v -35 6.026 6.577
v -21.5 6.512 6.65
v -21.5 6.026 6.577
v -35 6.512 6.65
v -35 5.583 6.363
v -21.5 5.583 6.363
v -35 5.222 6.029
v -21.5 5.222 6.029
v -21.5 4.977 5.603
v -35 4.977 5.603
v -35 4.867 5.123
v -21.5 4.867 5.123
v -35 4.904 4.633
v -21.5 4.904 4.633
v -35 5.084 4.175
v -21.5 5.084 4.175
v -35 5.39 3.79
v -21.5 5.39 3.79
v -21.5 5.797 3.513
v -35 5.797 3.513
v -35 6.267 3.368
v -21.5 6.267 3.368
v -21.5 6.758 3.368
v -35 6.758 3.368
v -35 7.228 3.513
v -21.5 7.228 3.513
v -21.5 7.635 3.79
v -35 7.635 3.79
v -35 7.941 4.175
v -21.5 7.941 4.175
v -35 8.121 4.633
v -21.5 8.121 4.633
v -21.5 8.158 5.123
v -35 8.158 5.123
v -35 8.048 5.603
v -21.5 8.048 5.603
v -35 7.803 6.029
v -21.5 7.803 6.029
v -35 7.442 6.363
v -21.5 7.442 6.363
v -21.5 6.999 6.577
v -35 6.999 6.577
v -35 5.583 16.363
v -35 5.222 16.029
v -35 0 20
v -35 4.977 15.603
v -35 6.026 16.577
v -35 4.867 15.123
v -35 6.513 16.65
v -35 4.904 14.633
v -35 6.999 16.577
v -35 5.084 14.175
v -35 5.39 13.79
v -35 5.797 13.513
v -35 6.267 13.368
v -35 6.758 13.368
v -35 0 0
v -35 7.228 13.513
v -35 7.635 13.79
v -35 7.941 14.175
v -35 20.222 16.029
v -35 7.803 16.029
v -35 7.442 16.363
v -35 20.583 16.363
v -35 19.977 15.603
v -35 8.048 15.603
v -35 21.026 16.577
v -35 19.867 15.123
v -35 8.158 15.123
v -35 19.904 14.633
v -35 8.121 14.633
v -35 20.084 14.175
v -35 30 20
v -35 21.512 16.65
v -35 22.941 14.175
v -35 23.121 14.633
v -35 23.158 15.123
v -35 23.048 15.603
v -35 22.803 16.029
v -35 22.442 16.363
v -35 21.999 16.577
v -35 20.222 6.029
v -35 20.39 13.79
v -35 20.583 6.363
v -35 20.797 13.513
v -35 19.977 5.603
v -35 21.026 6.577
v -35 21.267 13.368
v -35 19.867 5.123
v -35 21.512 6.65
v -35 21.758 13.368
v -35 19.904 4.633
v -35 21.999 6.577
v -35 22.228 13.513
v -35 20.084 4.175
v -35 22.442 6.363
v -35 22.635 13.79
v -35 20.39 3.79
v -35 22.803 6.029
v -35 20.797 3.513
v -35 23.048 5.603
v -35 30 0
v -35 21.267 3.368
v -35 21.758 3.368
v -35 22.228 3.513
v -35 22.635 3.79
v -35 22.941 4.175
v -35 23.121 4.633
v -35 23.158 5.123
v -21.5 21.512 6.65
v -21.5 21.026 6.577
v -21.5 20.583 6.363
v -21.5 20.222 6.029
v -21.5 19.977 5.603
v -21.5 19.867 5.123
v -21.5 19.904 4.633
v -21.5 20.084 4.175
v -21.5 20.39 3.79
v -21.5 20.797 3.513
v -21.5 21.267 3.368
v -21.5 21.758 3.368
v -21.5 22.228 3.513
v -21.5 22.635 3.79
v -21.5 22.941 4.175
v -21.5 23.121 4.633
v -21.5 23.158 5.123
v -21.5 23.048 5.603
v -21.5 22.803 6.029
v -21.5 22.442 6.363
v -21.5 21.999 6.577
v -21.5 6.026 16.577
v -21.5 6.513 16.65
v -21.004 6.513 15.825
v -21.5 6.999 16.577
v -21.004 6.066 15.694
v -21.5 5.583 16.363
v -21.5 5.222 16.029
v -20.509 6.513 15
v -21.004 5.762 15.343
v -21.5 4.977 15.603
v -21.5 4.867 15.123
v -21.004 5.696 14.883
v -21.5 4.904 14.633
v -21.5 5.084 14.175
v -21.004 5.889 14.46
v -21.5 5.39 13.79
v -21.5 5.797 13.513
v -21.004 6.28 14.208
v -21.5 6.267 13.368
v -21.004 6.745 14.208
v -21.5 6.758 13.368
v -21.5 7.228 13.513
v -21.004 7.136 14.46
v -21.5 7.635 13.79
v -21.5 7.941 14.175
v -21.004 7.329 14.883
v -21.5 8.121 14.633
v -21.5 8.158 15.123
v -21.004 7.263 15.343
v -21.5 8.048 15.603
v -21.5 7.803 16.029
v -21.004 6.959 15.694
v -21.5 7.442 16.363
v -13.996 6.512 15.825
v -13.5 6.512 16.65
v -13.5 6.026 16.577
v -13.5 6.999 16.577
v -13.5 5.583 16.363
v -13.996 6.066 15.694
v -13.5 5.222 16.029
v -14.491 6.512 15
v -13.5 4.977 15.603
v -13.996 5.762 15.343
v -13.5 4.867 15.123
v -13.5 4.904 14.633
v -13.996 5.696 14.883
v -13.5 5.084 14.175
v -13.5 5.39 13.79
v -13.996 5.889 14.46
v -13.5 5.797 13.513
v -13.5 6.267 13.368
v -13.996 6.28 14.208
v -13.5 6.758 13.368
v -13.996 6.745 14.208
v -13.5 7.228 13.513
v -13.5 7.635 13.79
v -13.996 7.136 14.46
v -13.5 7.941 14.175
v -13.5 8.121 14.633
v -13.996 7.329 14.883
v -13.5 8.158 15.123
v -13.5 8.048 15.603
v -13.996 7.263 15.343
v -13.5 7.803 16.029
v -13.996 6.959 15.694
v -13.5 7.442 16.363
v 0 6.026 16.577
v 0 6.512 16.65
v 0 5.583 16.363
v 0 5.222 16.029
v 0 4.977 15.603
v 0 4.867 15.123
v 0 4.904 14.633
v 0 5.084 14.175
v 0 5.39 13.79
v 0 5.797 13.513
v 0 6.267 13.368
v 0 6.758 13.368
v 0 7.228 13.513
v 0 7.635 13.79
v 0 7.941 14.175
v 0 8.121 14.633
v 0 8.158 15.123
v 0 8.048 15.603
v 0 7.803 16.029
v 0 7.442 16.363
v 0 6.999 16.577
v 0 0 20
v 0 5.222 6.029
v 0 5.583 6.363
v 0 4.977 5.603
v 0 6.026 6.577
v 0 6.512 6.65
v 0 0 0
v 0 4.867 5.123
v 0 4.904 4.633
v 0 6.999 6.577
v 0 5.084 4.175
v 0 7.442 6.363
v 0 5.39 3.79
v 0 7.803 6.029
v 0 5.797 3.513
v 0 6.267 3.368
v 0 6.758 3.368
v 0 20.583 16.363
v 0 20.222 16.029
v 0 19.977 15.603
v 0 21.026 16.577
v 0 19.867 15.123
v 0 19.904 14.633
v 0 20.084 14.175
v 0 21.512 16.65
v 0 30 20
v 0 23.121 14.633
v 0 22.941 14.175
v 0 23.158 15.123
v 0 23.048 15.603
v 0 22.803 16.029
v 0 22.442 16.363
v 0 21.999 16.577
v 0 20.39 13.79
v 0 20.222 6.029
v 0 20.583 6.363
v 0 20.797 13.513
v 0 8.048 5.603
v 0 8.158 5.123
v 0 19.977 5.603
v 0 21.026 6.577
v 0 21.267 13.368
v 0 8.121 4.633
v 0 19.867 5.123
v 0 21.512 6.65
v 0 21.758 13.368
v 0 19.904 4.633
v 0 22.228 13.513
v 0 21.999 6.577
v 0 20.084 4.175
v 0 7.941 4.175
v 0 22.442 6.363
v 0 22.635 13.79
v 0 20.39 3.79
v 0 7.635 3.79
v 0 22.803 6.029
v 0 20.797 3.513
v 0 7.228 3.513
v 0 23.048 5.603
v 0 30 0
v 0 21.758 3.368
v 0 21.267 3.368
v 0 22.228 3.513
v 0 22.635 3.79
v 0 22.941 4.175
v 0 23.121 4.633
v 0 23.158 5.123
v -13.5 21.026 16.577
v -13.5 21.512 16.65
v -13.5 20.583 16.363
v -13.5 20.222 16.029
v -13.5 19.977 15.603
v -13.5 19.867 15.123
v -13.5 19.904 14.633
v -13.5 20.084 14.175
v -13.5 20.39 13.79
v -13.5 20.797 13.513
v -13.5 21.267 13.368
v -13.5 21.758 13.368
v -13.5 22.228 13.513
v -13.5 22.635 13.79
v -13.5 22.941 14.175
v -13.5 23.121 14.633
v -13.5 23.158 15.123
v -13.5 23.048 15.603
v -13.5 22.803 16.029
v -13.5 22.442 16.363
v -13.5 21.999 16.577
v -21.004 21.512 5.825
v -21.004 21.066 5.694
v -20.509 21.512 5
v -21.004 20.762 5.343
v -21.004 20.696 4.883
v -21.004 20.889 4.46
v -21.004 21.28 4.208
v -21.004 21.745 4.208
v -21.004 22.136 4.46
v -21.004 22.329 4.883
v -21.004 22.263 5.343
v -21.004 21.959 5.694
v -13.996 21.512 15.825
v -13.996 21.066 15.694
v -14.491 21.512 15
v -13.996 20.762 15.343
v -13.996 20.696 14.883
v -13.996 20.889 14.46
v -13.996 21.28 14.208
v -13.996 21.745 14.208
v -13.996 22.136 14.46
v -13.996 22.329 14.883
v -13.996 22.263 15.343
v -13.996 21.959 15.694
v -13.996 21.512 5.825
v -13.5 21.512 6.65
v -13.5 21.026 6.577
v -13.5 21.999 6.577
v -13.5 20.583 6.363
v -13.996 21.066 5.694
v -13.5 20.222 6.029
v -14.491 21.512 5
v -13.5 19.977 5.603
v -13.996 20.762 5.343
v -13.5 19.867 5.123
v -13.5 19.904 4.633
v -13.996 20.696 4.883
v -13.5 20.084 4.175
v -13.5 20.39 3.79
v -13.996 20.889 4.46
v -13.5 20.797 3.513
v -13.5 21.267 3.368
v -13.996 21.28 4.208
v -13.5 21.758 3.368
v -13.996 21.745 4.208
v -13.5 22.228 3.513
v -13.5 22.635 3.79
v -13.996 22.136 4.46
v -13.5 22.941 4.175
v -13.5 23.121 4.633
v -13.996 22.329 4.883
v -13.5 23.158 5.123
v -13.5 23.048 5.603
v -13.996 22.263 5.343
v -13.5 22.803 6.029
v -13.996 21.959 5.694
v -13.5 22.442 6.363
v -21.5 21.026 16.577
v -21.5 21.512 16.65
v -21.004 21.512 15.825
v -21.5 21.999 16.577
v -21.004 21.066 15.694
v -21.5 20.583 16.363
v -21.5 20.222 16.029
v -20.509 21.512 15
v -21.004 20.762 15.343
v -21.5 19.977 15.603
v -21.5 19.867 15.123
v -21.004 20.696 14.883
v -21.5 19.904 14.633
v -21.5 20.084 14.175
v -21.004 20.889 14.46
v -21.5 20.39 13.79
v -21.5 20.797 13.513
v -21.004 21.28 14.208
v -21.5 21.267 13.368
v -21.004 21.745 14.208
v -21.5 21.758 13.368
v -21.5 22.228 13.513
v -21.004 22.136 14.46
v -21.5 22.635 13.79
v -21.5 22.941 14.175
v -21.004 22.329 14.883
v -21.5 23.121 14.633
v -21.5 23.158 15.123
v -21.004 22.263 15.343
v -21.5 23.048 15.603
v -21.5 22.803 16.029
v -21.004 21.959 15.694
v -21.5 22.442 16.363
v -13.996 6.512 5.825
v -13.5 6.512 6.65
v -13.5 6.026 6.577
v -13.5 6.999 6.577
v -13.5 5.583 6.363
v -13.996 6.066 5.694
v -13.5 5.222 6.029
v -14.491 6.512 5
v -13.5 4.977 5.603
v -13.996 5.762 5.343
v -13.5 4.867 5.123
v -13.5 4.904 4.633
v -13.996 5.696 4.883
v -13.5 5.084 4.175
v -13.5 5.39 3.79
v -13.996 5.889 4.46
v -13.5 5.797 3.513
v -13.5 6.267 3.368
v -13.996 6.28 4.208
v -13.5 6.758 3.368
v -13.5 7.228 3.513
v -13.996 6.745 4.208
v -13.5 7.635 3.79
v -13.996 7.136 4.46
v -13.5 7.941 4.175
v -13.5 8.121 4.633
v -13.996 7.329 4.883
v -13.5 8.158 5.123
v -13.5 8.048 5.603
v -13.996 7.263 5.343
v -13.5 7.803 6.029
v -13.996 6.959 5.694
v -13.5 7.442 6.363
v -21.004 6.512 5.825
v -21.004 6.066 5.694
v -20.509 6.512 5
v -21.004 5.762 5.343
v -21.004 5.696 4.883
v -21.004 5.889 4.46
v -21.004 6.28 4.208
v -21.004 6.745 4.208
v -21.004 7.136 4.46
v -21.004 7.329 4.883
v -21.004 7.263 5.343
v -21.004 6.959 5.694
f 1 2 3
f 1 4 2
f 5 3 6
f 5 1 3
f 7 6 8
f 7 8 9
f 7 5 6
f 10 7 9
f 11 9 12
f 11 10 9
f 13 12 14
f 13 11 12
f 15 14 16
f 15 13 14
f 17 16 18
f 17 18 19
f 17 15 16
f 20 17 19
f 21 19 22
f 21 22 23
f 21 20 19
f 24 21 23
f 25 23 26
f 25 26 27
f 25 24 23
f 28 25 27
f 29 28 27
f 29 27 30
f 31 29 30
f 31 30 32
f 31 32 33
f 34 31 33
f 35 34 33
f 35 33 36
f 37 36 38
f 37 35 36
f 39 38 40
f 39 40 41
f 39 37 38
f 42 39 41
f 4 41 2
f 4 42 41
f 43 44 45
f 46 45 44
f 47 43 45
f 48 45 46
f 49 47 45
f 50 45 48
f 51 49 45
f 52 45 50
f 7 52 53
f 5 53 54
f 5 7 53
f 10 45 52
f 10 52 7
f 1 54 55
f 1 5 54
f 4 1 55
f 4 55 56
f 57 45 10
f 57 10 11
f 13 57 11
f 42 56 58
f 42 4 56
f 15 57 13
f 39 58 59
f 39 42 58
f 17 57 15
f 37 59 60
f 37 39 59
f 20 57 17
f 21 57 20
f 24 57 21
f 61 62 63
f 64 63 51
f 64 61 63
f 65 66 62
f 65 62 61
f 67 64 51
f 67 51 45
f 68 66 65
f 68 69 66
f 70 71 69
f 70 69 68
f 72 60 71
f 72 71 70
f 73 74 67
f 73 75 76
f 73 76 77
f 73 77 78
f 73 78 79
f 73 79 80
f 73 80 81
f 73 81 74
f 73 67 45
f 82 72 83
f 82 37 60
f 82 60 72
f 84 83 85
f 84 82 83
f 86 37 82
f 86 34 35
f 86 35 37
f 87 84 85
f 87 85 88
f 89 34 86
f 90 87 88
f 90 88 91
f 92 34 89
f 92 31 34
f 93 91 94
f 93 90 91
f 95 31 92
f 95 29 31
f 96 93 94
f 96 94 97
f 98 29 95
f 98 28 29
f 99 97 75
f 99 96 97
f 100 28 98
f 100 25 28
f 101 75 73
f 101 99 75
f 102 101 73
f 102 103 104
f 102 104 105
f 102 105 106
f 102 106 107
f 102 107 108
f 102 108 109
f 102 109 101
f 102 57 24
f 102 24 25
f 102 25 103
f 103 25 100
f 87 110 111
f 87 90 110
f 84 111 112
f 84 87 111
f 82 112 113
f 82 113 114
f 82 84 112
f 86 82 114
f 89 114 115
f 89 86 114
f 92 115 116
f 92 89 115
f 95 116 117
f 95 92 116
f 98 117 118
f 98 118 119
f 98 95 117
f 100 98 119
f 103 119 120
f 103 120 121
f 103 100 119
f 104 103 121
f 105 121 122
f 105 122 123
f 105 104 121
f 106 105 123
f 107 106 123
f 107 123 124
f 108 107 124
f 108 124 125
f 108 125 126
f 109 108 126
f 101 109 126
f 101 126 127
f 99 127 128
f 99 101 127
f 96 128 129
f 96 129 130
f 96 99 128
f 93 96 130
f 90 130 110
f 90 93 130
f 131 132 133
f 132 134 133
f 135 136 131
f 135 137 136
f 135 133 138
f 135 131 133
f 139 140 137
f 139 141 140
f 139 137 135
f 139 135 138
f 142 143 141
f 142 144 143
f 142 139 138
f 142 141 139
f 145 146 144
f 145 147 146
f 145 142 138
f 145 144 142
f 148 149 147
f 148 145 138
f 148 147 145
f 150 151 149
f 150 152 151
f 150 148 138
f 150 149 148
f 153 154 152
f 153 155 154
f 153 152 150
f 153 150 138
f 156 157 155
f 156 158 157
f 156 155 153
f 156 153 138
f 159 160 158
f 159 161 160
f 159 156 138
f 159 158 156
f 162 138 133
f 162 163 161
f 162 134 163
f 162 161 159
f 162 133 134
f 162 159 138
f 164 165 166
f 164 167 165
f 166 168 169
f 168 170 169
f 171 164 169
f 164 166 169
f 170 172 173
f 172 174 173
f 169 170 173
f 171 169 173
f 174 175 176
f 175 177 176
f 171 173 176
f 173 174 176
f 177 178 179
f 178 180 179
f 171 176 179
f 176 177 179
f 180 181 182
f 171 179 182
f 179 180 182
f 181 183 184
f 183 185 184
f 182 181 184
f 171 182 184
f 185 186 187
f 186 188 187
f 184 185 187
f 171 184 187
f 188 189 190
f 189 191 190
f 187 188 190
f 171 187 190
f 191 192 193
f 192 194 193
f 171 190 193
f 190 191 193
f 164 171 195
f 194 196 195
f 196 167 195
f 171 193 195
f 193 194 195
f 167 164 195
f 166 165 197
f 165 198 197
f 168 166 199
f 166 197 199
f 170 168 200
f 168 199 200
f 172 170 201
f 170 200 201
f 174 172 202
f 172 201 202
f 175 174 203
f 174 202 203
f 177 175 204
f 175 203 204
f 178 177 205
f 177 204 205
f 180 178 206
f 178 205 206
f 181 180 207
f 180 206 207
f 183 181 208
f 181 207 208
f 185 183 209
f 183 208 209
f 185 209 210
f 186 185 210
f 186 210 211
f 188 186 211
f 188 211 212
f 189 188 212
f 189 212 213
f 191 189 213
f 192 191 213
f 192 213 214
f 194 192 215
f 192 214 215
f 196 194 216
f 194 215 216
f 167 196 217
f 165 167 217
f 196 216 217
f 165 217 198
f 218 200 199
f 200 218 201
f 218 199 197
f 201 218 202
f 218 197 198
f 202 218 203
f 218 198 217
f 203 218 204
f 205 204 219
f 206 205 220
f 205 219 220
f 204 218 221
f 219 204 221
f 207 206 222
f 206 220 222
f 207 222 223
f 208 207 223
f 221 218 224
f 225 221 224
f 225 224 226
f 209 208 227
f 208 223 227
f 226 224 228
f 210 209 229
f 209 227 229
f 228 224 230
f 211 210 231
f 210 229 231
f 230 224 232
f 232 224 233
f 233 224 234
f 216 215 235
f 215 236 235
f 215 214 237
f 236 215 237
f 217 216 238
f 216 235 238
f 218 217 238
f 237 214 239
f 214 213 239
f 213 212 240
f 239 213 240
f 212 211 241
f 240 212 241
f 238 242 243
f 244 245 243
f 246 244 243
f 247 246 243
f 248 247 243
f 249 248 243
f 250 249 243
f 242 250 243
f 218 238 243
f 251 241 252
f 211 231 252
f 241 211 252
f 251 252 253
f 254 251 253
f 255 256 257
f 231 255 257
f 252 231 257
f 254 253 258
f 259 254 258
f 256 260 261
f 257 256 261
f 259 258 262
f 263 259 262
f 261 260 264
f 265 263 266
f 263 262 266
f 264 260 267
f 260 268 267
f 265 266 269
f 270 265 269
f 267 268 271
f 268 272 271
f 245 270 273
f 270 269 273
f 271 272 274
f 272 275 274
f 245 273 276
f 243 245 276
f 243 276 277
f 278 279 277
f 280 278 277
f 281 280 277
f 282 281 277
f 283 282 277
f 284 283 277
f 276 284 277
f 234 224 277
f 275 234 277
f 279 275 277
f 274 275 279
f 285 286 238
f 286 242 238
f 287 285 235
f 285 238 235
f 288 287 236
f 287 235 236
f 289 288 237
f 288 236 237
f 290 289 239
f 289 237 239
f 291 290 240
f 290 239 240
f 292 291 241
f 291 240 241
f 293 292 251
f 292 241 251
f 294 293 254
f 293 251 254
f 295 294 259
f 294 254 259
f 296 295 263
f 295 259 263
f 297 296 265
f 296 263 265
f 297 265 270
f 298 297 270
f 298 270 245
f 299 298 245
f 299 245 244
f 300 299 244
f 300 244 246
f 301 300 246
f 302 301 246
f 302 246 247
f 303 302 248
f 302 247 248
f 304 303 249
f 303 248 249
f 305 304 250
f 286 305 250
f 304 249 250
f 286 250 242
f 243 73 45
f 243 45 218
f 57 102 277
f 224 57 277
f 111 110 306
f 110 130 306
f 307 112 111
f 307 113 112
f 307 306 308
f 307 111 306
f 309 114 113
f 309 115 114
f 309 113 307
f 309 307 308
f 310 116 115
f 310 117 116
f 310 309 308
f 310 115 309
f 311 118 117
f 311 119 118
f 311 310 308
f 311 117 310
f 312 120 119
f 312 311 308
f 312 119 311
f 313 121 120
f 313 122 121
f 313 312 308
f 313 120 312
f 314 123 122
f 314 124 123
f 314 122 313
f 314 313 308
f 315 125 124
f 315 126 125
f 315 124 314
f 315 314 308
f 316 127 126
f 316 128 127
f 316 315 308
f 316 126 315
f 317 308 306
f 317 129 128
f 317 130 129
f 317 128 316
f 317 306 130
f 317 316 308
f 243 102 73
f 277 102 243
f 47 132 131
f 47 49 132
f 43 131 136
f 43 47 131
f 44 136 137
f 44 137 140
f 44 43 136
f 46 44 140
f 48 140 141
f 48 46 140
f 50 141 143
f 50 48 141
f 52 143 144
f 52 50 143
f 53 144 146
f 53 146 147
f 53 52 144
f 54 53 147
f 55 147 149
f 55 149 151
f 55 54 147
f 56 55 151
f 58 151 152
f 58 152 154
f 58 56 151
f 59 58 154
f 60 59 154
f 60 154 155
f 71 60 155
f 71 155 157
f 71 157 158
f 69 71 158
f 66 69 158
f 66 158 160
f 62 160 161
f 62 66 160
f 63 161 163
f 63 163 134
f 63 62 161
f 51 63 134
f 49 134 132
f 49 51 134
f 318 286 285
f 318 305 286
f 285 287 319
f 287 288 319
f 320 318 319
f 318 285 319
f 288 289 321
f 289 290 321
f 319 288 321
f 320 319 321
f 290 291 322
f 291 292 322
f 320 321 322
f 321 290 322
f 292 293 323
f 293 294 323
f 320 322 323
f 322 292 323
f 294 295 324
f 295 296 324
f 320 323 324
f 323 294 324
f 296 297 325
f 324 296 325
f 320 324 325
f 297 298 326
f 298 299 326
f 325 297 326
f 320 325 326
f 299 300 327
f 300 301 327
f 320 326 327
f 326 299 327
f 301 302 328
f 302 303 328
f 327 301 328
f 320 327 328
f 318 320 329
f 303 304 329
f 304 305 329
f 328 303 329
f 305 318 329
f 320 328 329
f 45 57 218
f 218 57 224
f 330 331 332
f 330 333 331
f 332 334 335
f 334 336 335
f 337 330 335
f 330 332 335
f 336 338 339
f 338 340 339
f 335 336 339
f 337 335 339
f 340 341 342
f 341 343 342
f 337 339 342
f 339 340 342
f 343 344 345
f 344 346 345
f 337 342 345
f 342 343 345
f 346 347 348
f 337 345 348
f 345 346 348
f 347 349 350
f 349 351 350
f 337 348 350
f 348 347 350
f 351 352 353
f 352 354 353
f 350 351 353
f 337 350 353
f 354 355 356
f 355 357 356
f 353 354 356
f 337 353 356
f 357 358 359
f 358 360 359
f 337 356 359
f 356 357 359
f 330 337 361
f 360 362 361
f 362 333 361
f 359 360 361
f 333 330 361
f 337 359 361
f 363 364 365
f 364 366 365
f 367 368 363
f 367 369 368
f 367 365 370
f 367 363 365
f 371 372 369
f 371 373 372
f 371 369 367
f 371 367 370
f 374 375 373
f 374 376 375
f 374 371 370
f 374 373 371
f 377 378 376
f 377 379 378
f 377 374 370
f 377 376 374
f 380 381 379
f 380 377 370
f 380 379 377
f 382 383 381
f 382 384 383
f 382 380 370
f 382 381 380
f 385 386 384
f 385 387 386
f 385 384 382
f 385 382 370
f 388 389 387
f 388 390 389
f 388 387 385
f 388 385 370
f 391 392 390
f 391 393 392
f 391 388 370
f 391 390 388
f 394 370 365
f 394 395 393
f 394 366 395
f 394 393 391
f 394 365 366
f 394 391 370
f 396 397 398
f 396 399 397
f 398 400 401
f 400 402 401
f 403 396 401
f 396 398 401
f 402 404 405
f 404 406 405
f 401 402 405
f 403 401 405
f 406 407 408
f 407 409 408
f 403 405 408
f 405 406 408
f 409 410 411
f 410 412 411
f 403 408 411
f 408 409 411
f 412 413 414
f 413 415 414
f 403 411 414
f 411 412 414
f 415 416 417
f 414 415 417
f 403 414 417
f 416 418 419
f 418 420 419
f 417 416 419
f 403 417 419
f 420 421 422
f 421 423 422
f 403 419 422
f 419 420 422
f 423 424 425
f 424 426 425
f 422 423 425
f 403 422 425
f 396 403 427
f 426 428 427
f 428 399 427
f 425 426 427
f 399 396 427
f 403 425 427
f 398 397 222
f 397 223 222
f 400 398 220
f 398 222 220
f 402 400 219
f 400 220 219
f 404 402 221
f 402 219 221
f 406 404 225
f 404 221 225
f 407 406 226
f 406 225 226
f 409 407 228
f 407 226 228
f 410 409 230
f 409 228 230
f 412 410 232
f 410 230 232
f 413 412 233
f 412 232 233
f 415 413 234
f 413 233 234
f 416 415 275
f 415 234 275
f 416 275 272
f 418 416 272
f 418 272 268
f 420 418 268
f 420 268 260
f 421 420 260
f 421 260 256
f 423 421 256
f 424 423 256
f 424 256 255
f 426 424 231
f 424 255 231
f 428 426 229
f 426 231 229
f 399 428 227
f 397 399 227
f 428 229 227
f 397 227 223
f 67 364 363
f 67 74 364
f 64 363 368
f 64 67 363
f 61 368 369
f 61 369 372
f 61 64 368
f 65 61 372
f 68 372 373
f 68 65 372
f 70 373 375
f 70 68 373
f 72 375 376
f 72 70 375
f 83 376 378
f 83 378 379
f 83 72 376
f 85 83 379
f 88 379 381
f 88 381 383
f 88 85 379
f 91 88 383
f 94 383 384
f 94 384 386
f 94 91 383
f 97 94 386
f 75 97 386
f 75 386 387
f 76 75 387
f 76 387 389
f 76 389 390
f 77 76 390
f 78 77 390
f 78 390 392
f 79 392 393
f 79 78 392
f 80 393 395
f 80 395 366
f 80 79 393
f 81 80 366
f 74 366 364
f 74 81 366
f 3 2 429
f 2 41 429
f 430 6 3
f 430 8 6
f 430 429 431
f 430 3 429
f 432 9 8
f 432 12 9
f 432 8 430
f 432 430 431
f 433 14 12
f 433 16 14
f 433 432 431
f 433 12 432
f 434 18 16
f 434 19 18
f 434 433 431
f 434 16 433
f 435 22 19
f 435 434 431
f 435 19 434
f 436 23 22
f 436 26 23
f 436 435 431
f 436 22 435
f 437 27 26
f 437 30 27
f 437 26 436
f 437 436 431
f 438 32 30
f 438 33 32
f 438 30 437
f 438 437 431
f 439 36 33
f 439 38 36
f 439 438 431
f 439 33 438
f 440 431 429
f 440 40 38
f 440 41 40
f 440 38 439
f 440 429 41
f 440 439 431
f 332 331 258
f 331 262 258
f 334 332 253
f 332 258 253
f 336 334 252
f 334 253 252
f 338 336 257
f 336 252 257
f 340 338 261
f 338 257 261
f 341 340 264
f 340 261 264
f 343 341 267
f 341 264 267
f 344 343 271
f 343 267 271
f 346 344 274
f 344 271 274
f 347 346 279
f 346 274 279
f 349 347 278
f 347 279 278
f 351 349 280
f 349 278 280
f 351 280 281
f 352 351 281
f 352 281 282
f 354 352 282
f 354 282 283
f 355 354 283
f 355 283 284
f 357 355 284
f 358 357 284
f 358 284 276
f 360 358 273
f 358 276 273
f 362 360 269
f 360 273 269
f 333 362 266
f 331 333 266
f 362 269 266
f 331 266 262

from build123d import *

# Parameters (mm, degrees)
SKETCH1_W                      = 35
SKETCH1_H                      = 30
BOSS_EXTRUDE1_DEPTH            = 20
M4X0_7_TAPPED_HOLE1_AT_2_COUNT = 2
M4X0_7_TAPPED_HOLE1_AT_2_PITCH = 18.027756377
M4X0_7_TAPPED_HOLE1_AT_3_COUNT = 2
M4X0_7_TAPPED_HOLE1_AT_3_PITCH = 15
M4X0_7_TAPPED_HOLE1_AT_4_COUNT = 2
M4X0_7_TAPPED_HOLE1_AT_4_PITCH = 10


with BuildPart() as part:
    # Sketch1 → Boss-Extrude1 (new body)
    with BuildSketch(Plane.XY):
        with Locations((-17.5, 15)):
            Rectangle(SKETCH1_W, SKETCH1_H)
    extrude(amount=BOSS_EXTRUDE1_DEPTH)

    # Sketch6 → M4x0.7 Tapped Hole1 (revolve, cut)
    with BuildSketch(Plane(origin=(-35, 21.5125, 5), x_dir=(0, 0, 1), z_dir=(0, 1, 0))):
        Polygon((0, 0), (0, 14.491420021), (1.65, 13.5), (1.65, 0), align=None)
    m4x0_7_tapped_hole1 = revolve(axis=Axis((-41.35, 21.5125, 5), (1, 0, 0)), mode=Mode.SUBTRACT)

    # M4x0.7 Tapped Hole1 at 2: M4x0.7 Tapped Hole1 ×2
    with Locations(*[Vector(0, -0.832050294, 0.554700196) * (i * M4X0_7_TAPPED_HOLE1_AT_2_PITCH) for i in range(1, M4X0_7_TAPPED_HOLE1_AT_2_COUNT)]):
        add(m4x0_7_tapped_hole1, mode=Mode.SUBTRACT)

    # M4x0.7 Tapped Hole1 at 3: M4x0.7 Tapped Hole1 ×2
    with Locations(*[(0, -i * M4X0_7_TAPPED_HOLE1_AT_3_PITCH, 0) for i in range(1, M4X0_7_TAPPED_HOLE1_AT_3_COUNT)]):
        add(m4x0_7_tapped_hole1, mode=Mode.SUBTRACT)

    # M4x0.7 Tapped Hole1 at 4: M4x0.7 Tapped Hole1 ×2
    with Locations(*[(0, 0, i * M4X0_7_TAPPED_HOLE1_AT_4_PITCH) for i in range(1, M4X0_7_TAPPED_HOLE1_AT_4_COUNT)]):
        add(m4x0_7_tapped_hole1, mode=Mode.SUBTRACT)

    # Mirror1: M4x0.7 Tapped Hole1 across plane
    add(m4x0_7_tapped_hole1.mirror(Plane.ZY.offset(17.5)), mode=Mode.SUBTRACT)

    # Mirror1 copy 1 sketch → Mirror1 copy 1 (revolve, cut)
    with BuildSketch(Plane(origin=(0, 6.5125, 15), x_dir=(0, 0, 1), z_dir=(0, 1, 0))):
        Polygon((0, 0), (0, -14.491420021), (1.65, -13.5), (1.65, 0), align=None)
    revolve(axis=Axis((6.35, 6.5125, 15), (1, 0, 0)), mode=Mode.SUBTRACT)

    # Mirror1 copy 2 sketch → Mirror1 copy 2 (revolve, cut)
    with BuildSketch(Plane(origin=(0, 6.5125, 5), x_dir=(0, 0, 1), z_dir=(0, 1, 0))):
        Polygon((0, 0), (0, -14.491420021), (1.65, -13.5), (1.65, 0), align=None)
    revolve(axis=Axis((6.35, 6.5125, 5), (1, 0, 0)), mode=Mode.SUBTRACT)

    # Mirror1 copy 3 sketch → Mirror1 copy 3 (revolve, cut)
    with BuildSketch(Plane(origin=(0, 21.5125, 15), x_dir=(0, 0, 1), z_dir=(0, 1, 0))):
        Polygon((0, 0), (0, -14.491420021), (1.65, -13.5), (1.65, 0), align=None)
    revolve(axis=Axis((6.35, 21.5125, 15), (1, 0, 0)), mode=Mode.SUBTRACT)


solid = part.part
